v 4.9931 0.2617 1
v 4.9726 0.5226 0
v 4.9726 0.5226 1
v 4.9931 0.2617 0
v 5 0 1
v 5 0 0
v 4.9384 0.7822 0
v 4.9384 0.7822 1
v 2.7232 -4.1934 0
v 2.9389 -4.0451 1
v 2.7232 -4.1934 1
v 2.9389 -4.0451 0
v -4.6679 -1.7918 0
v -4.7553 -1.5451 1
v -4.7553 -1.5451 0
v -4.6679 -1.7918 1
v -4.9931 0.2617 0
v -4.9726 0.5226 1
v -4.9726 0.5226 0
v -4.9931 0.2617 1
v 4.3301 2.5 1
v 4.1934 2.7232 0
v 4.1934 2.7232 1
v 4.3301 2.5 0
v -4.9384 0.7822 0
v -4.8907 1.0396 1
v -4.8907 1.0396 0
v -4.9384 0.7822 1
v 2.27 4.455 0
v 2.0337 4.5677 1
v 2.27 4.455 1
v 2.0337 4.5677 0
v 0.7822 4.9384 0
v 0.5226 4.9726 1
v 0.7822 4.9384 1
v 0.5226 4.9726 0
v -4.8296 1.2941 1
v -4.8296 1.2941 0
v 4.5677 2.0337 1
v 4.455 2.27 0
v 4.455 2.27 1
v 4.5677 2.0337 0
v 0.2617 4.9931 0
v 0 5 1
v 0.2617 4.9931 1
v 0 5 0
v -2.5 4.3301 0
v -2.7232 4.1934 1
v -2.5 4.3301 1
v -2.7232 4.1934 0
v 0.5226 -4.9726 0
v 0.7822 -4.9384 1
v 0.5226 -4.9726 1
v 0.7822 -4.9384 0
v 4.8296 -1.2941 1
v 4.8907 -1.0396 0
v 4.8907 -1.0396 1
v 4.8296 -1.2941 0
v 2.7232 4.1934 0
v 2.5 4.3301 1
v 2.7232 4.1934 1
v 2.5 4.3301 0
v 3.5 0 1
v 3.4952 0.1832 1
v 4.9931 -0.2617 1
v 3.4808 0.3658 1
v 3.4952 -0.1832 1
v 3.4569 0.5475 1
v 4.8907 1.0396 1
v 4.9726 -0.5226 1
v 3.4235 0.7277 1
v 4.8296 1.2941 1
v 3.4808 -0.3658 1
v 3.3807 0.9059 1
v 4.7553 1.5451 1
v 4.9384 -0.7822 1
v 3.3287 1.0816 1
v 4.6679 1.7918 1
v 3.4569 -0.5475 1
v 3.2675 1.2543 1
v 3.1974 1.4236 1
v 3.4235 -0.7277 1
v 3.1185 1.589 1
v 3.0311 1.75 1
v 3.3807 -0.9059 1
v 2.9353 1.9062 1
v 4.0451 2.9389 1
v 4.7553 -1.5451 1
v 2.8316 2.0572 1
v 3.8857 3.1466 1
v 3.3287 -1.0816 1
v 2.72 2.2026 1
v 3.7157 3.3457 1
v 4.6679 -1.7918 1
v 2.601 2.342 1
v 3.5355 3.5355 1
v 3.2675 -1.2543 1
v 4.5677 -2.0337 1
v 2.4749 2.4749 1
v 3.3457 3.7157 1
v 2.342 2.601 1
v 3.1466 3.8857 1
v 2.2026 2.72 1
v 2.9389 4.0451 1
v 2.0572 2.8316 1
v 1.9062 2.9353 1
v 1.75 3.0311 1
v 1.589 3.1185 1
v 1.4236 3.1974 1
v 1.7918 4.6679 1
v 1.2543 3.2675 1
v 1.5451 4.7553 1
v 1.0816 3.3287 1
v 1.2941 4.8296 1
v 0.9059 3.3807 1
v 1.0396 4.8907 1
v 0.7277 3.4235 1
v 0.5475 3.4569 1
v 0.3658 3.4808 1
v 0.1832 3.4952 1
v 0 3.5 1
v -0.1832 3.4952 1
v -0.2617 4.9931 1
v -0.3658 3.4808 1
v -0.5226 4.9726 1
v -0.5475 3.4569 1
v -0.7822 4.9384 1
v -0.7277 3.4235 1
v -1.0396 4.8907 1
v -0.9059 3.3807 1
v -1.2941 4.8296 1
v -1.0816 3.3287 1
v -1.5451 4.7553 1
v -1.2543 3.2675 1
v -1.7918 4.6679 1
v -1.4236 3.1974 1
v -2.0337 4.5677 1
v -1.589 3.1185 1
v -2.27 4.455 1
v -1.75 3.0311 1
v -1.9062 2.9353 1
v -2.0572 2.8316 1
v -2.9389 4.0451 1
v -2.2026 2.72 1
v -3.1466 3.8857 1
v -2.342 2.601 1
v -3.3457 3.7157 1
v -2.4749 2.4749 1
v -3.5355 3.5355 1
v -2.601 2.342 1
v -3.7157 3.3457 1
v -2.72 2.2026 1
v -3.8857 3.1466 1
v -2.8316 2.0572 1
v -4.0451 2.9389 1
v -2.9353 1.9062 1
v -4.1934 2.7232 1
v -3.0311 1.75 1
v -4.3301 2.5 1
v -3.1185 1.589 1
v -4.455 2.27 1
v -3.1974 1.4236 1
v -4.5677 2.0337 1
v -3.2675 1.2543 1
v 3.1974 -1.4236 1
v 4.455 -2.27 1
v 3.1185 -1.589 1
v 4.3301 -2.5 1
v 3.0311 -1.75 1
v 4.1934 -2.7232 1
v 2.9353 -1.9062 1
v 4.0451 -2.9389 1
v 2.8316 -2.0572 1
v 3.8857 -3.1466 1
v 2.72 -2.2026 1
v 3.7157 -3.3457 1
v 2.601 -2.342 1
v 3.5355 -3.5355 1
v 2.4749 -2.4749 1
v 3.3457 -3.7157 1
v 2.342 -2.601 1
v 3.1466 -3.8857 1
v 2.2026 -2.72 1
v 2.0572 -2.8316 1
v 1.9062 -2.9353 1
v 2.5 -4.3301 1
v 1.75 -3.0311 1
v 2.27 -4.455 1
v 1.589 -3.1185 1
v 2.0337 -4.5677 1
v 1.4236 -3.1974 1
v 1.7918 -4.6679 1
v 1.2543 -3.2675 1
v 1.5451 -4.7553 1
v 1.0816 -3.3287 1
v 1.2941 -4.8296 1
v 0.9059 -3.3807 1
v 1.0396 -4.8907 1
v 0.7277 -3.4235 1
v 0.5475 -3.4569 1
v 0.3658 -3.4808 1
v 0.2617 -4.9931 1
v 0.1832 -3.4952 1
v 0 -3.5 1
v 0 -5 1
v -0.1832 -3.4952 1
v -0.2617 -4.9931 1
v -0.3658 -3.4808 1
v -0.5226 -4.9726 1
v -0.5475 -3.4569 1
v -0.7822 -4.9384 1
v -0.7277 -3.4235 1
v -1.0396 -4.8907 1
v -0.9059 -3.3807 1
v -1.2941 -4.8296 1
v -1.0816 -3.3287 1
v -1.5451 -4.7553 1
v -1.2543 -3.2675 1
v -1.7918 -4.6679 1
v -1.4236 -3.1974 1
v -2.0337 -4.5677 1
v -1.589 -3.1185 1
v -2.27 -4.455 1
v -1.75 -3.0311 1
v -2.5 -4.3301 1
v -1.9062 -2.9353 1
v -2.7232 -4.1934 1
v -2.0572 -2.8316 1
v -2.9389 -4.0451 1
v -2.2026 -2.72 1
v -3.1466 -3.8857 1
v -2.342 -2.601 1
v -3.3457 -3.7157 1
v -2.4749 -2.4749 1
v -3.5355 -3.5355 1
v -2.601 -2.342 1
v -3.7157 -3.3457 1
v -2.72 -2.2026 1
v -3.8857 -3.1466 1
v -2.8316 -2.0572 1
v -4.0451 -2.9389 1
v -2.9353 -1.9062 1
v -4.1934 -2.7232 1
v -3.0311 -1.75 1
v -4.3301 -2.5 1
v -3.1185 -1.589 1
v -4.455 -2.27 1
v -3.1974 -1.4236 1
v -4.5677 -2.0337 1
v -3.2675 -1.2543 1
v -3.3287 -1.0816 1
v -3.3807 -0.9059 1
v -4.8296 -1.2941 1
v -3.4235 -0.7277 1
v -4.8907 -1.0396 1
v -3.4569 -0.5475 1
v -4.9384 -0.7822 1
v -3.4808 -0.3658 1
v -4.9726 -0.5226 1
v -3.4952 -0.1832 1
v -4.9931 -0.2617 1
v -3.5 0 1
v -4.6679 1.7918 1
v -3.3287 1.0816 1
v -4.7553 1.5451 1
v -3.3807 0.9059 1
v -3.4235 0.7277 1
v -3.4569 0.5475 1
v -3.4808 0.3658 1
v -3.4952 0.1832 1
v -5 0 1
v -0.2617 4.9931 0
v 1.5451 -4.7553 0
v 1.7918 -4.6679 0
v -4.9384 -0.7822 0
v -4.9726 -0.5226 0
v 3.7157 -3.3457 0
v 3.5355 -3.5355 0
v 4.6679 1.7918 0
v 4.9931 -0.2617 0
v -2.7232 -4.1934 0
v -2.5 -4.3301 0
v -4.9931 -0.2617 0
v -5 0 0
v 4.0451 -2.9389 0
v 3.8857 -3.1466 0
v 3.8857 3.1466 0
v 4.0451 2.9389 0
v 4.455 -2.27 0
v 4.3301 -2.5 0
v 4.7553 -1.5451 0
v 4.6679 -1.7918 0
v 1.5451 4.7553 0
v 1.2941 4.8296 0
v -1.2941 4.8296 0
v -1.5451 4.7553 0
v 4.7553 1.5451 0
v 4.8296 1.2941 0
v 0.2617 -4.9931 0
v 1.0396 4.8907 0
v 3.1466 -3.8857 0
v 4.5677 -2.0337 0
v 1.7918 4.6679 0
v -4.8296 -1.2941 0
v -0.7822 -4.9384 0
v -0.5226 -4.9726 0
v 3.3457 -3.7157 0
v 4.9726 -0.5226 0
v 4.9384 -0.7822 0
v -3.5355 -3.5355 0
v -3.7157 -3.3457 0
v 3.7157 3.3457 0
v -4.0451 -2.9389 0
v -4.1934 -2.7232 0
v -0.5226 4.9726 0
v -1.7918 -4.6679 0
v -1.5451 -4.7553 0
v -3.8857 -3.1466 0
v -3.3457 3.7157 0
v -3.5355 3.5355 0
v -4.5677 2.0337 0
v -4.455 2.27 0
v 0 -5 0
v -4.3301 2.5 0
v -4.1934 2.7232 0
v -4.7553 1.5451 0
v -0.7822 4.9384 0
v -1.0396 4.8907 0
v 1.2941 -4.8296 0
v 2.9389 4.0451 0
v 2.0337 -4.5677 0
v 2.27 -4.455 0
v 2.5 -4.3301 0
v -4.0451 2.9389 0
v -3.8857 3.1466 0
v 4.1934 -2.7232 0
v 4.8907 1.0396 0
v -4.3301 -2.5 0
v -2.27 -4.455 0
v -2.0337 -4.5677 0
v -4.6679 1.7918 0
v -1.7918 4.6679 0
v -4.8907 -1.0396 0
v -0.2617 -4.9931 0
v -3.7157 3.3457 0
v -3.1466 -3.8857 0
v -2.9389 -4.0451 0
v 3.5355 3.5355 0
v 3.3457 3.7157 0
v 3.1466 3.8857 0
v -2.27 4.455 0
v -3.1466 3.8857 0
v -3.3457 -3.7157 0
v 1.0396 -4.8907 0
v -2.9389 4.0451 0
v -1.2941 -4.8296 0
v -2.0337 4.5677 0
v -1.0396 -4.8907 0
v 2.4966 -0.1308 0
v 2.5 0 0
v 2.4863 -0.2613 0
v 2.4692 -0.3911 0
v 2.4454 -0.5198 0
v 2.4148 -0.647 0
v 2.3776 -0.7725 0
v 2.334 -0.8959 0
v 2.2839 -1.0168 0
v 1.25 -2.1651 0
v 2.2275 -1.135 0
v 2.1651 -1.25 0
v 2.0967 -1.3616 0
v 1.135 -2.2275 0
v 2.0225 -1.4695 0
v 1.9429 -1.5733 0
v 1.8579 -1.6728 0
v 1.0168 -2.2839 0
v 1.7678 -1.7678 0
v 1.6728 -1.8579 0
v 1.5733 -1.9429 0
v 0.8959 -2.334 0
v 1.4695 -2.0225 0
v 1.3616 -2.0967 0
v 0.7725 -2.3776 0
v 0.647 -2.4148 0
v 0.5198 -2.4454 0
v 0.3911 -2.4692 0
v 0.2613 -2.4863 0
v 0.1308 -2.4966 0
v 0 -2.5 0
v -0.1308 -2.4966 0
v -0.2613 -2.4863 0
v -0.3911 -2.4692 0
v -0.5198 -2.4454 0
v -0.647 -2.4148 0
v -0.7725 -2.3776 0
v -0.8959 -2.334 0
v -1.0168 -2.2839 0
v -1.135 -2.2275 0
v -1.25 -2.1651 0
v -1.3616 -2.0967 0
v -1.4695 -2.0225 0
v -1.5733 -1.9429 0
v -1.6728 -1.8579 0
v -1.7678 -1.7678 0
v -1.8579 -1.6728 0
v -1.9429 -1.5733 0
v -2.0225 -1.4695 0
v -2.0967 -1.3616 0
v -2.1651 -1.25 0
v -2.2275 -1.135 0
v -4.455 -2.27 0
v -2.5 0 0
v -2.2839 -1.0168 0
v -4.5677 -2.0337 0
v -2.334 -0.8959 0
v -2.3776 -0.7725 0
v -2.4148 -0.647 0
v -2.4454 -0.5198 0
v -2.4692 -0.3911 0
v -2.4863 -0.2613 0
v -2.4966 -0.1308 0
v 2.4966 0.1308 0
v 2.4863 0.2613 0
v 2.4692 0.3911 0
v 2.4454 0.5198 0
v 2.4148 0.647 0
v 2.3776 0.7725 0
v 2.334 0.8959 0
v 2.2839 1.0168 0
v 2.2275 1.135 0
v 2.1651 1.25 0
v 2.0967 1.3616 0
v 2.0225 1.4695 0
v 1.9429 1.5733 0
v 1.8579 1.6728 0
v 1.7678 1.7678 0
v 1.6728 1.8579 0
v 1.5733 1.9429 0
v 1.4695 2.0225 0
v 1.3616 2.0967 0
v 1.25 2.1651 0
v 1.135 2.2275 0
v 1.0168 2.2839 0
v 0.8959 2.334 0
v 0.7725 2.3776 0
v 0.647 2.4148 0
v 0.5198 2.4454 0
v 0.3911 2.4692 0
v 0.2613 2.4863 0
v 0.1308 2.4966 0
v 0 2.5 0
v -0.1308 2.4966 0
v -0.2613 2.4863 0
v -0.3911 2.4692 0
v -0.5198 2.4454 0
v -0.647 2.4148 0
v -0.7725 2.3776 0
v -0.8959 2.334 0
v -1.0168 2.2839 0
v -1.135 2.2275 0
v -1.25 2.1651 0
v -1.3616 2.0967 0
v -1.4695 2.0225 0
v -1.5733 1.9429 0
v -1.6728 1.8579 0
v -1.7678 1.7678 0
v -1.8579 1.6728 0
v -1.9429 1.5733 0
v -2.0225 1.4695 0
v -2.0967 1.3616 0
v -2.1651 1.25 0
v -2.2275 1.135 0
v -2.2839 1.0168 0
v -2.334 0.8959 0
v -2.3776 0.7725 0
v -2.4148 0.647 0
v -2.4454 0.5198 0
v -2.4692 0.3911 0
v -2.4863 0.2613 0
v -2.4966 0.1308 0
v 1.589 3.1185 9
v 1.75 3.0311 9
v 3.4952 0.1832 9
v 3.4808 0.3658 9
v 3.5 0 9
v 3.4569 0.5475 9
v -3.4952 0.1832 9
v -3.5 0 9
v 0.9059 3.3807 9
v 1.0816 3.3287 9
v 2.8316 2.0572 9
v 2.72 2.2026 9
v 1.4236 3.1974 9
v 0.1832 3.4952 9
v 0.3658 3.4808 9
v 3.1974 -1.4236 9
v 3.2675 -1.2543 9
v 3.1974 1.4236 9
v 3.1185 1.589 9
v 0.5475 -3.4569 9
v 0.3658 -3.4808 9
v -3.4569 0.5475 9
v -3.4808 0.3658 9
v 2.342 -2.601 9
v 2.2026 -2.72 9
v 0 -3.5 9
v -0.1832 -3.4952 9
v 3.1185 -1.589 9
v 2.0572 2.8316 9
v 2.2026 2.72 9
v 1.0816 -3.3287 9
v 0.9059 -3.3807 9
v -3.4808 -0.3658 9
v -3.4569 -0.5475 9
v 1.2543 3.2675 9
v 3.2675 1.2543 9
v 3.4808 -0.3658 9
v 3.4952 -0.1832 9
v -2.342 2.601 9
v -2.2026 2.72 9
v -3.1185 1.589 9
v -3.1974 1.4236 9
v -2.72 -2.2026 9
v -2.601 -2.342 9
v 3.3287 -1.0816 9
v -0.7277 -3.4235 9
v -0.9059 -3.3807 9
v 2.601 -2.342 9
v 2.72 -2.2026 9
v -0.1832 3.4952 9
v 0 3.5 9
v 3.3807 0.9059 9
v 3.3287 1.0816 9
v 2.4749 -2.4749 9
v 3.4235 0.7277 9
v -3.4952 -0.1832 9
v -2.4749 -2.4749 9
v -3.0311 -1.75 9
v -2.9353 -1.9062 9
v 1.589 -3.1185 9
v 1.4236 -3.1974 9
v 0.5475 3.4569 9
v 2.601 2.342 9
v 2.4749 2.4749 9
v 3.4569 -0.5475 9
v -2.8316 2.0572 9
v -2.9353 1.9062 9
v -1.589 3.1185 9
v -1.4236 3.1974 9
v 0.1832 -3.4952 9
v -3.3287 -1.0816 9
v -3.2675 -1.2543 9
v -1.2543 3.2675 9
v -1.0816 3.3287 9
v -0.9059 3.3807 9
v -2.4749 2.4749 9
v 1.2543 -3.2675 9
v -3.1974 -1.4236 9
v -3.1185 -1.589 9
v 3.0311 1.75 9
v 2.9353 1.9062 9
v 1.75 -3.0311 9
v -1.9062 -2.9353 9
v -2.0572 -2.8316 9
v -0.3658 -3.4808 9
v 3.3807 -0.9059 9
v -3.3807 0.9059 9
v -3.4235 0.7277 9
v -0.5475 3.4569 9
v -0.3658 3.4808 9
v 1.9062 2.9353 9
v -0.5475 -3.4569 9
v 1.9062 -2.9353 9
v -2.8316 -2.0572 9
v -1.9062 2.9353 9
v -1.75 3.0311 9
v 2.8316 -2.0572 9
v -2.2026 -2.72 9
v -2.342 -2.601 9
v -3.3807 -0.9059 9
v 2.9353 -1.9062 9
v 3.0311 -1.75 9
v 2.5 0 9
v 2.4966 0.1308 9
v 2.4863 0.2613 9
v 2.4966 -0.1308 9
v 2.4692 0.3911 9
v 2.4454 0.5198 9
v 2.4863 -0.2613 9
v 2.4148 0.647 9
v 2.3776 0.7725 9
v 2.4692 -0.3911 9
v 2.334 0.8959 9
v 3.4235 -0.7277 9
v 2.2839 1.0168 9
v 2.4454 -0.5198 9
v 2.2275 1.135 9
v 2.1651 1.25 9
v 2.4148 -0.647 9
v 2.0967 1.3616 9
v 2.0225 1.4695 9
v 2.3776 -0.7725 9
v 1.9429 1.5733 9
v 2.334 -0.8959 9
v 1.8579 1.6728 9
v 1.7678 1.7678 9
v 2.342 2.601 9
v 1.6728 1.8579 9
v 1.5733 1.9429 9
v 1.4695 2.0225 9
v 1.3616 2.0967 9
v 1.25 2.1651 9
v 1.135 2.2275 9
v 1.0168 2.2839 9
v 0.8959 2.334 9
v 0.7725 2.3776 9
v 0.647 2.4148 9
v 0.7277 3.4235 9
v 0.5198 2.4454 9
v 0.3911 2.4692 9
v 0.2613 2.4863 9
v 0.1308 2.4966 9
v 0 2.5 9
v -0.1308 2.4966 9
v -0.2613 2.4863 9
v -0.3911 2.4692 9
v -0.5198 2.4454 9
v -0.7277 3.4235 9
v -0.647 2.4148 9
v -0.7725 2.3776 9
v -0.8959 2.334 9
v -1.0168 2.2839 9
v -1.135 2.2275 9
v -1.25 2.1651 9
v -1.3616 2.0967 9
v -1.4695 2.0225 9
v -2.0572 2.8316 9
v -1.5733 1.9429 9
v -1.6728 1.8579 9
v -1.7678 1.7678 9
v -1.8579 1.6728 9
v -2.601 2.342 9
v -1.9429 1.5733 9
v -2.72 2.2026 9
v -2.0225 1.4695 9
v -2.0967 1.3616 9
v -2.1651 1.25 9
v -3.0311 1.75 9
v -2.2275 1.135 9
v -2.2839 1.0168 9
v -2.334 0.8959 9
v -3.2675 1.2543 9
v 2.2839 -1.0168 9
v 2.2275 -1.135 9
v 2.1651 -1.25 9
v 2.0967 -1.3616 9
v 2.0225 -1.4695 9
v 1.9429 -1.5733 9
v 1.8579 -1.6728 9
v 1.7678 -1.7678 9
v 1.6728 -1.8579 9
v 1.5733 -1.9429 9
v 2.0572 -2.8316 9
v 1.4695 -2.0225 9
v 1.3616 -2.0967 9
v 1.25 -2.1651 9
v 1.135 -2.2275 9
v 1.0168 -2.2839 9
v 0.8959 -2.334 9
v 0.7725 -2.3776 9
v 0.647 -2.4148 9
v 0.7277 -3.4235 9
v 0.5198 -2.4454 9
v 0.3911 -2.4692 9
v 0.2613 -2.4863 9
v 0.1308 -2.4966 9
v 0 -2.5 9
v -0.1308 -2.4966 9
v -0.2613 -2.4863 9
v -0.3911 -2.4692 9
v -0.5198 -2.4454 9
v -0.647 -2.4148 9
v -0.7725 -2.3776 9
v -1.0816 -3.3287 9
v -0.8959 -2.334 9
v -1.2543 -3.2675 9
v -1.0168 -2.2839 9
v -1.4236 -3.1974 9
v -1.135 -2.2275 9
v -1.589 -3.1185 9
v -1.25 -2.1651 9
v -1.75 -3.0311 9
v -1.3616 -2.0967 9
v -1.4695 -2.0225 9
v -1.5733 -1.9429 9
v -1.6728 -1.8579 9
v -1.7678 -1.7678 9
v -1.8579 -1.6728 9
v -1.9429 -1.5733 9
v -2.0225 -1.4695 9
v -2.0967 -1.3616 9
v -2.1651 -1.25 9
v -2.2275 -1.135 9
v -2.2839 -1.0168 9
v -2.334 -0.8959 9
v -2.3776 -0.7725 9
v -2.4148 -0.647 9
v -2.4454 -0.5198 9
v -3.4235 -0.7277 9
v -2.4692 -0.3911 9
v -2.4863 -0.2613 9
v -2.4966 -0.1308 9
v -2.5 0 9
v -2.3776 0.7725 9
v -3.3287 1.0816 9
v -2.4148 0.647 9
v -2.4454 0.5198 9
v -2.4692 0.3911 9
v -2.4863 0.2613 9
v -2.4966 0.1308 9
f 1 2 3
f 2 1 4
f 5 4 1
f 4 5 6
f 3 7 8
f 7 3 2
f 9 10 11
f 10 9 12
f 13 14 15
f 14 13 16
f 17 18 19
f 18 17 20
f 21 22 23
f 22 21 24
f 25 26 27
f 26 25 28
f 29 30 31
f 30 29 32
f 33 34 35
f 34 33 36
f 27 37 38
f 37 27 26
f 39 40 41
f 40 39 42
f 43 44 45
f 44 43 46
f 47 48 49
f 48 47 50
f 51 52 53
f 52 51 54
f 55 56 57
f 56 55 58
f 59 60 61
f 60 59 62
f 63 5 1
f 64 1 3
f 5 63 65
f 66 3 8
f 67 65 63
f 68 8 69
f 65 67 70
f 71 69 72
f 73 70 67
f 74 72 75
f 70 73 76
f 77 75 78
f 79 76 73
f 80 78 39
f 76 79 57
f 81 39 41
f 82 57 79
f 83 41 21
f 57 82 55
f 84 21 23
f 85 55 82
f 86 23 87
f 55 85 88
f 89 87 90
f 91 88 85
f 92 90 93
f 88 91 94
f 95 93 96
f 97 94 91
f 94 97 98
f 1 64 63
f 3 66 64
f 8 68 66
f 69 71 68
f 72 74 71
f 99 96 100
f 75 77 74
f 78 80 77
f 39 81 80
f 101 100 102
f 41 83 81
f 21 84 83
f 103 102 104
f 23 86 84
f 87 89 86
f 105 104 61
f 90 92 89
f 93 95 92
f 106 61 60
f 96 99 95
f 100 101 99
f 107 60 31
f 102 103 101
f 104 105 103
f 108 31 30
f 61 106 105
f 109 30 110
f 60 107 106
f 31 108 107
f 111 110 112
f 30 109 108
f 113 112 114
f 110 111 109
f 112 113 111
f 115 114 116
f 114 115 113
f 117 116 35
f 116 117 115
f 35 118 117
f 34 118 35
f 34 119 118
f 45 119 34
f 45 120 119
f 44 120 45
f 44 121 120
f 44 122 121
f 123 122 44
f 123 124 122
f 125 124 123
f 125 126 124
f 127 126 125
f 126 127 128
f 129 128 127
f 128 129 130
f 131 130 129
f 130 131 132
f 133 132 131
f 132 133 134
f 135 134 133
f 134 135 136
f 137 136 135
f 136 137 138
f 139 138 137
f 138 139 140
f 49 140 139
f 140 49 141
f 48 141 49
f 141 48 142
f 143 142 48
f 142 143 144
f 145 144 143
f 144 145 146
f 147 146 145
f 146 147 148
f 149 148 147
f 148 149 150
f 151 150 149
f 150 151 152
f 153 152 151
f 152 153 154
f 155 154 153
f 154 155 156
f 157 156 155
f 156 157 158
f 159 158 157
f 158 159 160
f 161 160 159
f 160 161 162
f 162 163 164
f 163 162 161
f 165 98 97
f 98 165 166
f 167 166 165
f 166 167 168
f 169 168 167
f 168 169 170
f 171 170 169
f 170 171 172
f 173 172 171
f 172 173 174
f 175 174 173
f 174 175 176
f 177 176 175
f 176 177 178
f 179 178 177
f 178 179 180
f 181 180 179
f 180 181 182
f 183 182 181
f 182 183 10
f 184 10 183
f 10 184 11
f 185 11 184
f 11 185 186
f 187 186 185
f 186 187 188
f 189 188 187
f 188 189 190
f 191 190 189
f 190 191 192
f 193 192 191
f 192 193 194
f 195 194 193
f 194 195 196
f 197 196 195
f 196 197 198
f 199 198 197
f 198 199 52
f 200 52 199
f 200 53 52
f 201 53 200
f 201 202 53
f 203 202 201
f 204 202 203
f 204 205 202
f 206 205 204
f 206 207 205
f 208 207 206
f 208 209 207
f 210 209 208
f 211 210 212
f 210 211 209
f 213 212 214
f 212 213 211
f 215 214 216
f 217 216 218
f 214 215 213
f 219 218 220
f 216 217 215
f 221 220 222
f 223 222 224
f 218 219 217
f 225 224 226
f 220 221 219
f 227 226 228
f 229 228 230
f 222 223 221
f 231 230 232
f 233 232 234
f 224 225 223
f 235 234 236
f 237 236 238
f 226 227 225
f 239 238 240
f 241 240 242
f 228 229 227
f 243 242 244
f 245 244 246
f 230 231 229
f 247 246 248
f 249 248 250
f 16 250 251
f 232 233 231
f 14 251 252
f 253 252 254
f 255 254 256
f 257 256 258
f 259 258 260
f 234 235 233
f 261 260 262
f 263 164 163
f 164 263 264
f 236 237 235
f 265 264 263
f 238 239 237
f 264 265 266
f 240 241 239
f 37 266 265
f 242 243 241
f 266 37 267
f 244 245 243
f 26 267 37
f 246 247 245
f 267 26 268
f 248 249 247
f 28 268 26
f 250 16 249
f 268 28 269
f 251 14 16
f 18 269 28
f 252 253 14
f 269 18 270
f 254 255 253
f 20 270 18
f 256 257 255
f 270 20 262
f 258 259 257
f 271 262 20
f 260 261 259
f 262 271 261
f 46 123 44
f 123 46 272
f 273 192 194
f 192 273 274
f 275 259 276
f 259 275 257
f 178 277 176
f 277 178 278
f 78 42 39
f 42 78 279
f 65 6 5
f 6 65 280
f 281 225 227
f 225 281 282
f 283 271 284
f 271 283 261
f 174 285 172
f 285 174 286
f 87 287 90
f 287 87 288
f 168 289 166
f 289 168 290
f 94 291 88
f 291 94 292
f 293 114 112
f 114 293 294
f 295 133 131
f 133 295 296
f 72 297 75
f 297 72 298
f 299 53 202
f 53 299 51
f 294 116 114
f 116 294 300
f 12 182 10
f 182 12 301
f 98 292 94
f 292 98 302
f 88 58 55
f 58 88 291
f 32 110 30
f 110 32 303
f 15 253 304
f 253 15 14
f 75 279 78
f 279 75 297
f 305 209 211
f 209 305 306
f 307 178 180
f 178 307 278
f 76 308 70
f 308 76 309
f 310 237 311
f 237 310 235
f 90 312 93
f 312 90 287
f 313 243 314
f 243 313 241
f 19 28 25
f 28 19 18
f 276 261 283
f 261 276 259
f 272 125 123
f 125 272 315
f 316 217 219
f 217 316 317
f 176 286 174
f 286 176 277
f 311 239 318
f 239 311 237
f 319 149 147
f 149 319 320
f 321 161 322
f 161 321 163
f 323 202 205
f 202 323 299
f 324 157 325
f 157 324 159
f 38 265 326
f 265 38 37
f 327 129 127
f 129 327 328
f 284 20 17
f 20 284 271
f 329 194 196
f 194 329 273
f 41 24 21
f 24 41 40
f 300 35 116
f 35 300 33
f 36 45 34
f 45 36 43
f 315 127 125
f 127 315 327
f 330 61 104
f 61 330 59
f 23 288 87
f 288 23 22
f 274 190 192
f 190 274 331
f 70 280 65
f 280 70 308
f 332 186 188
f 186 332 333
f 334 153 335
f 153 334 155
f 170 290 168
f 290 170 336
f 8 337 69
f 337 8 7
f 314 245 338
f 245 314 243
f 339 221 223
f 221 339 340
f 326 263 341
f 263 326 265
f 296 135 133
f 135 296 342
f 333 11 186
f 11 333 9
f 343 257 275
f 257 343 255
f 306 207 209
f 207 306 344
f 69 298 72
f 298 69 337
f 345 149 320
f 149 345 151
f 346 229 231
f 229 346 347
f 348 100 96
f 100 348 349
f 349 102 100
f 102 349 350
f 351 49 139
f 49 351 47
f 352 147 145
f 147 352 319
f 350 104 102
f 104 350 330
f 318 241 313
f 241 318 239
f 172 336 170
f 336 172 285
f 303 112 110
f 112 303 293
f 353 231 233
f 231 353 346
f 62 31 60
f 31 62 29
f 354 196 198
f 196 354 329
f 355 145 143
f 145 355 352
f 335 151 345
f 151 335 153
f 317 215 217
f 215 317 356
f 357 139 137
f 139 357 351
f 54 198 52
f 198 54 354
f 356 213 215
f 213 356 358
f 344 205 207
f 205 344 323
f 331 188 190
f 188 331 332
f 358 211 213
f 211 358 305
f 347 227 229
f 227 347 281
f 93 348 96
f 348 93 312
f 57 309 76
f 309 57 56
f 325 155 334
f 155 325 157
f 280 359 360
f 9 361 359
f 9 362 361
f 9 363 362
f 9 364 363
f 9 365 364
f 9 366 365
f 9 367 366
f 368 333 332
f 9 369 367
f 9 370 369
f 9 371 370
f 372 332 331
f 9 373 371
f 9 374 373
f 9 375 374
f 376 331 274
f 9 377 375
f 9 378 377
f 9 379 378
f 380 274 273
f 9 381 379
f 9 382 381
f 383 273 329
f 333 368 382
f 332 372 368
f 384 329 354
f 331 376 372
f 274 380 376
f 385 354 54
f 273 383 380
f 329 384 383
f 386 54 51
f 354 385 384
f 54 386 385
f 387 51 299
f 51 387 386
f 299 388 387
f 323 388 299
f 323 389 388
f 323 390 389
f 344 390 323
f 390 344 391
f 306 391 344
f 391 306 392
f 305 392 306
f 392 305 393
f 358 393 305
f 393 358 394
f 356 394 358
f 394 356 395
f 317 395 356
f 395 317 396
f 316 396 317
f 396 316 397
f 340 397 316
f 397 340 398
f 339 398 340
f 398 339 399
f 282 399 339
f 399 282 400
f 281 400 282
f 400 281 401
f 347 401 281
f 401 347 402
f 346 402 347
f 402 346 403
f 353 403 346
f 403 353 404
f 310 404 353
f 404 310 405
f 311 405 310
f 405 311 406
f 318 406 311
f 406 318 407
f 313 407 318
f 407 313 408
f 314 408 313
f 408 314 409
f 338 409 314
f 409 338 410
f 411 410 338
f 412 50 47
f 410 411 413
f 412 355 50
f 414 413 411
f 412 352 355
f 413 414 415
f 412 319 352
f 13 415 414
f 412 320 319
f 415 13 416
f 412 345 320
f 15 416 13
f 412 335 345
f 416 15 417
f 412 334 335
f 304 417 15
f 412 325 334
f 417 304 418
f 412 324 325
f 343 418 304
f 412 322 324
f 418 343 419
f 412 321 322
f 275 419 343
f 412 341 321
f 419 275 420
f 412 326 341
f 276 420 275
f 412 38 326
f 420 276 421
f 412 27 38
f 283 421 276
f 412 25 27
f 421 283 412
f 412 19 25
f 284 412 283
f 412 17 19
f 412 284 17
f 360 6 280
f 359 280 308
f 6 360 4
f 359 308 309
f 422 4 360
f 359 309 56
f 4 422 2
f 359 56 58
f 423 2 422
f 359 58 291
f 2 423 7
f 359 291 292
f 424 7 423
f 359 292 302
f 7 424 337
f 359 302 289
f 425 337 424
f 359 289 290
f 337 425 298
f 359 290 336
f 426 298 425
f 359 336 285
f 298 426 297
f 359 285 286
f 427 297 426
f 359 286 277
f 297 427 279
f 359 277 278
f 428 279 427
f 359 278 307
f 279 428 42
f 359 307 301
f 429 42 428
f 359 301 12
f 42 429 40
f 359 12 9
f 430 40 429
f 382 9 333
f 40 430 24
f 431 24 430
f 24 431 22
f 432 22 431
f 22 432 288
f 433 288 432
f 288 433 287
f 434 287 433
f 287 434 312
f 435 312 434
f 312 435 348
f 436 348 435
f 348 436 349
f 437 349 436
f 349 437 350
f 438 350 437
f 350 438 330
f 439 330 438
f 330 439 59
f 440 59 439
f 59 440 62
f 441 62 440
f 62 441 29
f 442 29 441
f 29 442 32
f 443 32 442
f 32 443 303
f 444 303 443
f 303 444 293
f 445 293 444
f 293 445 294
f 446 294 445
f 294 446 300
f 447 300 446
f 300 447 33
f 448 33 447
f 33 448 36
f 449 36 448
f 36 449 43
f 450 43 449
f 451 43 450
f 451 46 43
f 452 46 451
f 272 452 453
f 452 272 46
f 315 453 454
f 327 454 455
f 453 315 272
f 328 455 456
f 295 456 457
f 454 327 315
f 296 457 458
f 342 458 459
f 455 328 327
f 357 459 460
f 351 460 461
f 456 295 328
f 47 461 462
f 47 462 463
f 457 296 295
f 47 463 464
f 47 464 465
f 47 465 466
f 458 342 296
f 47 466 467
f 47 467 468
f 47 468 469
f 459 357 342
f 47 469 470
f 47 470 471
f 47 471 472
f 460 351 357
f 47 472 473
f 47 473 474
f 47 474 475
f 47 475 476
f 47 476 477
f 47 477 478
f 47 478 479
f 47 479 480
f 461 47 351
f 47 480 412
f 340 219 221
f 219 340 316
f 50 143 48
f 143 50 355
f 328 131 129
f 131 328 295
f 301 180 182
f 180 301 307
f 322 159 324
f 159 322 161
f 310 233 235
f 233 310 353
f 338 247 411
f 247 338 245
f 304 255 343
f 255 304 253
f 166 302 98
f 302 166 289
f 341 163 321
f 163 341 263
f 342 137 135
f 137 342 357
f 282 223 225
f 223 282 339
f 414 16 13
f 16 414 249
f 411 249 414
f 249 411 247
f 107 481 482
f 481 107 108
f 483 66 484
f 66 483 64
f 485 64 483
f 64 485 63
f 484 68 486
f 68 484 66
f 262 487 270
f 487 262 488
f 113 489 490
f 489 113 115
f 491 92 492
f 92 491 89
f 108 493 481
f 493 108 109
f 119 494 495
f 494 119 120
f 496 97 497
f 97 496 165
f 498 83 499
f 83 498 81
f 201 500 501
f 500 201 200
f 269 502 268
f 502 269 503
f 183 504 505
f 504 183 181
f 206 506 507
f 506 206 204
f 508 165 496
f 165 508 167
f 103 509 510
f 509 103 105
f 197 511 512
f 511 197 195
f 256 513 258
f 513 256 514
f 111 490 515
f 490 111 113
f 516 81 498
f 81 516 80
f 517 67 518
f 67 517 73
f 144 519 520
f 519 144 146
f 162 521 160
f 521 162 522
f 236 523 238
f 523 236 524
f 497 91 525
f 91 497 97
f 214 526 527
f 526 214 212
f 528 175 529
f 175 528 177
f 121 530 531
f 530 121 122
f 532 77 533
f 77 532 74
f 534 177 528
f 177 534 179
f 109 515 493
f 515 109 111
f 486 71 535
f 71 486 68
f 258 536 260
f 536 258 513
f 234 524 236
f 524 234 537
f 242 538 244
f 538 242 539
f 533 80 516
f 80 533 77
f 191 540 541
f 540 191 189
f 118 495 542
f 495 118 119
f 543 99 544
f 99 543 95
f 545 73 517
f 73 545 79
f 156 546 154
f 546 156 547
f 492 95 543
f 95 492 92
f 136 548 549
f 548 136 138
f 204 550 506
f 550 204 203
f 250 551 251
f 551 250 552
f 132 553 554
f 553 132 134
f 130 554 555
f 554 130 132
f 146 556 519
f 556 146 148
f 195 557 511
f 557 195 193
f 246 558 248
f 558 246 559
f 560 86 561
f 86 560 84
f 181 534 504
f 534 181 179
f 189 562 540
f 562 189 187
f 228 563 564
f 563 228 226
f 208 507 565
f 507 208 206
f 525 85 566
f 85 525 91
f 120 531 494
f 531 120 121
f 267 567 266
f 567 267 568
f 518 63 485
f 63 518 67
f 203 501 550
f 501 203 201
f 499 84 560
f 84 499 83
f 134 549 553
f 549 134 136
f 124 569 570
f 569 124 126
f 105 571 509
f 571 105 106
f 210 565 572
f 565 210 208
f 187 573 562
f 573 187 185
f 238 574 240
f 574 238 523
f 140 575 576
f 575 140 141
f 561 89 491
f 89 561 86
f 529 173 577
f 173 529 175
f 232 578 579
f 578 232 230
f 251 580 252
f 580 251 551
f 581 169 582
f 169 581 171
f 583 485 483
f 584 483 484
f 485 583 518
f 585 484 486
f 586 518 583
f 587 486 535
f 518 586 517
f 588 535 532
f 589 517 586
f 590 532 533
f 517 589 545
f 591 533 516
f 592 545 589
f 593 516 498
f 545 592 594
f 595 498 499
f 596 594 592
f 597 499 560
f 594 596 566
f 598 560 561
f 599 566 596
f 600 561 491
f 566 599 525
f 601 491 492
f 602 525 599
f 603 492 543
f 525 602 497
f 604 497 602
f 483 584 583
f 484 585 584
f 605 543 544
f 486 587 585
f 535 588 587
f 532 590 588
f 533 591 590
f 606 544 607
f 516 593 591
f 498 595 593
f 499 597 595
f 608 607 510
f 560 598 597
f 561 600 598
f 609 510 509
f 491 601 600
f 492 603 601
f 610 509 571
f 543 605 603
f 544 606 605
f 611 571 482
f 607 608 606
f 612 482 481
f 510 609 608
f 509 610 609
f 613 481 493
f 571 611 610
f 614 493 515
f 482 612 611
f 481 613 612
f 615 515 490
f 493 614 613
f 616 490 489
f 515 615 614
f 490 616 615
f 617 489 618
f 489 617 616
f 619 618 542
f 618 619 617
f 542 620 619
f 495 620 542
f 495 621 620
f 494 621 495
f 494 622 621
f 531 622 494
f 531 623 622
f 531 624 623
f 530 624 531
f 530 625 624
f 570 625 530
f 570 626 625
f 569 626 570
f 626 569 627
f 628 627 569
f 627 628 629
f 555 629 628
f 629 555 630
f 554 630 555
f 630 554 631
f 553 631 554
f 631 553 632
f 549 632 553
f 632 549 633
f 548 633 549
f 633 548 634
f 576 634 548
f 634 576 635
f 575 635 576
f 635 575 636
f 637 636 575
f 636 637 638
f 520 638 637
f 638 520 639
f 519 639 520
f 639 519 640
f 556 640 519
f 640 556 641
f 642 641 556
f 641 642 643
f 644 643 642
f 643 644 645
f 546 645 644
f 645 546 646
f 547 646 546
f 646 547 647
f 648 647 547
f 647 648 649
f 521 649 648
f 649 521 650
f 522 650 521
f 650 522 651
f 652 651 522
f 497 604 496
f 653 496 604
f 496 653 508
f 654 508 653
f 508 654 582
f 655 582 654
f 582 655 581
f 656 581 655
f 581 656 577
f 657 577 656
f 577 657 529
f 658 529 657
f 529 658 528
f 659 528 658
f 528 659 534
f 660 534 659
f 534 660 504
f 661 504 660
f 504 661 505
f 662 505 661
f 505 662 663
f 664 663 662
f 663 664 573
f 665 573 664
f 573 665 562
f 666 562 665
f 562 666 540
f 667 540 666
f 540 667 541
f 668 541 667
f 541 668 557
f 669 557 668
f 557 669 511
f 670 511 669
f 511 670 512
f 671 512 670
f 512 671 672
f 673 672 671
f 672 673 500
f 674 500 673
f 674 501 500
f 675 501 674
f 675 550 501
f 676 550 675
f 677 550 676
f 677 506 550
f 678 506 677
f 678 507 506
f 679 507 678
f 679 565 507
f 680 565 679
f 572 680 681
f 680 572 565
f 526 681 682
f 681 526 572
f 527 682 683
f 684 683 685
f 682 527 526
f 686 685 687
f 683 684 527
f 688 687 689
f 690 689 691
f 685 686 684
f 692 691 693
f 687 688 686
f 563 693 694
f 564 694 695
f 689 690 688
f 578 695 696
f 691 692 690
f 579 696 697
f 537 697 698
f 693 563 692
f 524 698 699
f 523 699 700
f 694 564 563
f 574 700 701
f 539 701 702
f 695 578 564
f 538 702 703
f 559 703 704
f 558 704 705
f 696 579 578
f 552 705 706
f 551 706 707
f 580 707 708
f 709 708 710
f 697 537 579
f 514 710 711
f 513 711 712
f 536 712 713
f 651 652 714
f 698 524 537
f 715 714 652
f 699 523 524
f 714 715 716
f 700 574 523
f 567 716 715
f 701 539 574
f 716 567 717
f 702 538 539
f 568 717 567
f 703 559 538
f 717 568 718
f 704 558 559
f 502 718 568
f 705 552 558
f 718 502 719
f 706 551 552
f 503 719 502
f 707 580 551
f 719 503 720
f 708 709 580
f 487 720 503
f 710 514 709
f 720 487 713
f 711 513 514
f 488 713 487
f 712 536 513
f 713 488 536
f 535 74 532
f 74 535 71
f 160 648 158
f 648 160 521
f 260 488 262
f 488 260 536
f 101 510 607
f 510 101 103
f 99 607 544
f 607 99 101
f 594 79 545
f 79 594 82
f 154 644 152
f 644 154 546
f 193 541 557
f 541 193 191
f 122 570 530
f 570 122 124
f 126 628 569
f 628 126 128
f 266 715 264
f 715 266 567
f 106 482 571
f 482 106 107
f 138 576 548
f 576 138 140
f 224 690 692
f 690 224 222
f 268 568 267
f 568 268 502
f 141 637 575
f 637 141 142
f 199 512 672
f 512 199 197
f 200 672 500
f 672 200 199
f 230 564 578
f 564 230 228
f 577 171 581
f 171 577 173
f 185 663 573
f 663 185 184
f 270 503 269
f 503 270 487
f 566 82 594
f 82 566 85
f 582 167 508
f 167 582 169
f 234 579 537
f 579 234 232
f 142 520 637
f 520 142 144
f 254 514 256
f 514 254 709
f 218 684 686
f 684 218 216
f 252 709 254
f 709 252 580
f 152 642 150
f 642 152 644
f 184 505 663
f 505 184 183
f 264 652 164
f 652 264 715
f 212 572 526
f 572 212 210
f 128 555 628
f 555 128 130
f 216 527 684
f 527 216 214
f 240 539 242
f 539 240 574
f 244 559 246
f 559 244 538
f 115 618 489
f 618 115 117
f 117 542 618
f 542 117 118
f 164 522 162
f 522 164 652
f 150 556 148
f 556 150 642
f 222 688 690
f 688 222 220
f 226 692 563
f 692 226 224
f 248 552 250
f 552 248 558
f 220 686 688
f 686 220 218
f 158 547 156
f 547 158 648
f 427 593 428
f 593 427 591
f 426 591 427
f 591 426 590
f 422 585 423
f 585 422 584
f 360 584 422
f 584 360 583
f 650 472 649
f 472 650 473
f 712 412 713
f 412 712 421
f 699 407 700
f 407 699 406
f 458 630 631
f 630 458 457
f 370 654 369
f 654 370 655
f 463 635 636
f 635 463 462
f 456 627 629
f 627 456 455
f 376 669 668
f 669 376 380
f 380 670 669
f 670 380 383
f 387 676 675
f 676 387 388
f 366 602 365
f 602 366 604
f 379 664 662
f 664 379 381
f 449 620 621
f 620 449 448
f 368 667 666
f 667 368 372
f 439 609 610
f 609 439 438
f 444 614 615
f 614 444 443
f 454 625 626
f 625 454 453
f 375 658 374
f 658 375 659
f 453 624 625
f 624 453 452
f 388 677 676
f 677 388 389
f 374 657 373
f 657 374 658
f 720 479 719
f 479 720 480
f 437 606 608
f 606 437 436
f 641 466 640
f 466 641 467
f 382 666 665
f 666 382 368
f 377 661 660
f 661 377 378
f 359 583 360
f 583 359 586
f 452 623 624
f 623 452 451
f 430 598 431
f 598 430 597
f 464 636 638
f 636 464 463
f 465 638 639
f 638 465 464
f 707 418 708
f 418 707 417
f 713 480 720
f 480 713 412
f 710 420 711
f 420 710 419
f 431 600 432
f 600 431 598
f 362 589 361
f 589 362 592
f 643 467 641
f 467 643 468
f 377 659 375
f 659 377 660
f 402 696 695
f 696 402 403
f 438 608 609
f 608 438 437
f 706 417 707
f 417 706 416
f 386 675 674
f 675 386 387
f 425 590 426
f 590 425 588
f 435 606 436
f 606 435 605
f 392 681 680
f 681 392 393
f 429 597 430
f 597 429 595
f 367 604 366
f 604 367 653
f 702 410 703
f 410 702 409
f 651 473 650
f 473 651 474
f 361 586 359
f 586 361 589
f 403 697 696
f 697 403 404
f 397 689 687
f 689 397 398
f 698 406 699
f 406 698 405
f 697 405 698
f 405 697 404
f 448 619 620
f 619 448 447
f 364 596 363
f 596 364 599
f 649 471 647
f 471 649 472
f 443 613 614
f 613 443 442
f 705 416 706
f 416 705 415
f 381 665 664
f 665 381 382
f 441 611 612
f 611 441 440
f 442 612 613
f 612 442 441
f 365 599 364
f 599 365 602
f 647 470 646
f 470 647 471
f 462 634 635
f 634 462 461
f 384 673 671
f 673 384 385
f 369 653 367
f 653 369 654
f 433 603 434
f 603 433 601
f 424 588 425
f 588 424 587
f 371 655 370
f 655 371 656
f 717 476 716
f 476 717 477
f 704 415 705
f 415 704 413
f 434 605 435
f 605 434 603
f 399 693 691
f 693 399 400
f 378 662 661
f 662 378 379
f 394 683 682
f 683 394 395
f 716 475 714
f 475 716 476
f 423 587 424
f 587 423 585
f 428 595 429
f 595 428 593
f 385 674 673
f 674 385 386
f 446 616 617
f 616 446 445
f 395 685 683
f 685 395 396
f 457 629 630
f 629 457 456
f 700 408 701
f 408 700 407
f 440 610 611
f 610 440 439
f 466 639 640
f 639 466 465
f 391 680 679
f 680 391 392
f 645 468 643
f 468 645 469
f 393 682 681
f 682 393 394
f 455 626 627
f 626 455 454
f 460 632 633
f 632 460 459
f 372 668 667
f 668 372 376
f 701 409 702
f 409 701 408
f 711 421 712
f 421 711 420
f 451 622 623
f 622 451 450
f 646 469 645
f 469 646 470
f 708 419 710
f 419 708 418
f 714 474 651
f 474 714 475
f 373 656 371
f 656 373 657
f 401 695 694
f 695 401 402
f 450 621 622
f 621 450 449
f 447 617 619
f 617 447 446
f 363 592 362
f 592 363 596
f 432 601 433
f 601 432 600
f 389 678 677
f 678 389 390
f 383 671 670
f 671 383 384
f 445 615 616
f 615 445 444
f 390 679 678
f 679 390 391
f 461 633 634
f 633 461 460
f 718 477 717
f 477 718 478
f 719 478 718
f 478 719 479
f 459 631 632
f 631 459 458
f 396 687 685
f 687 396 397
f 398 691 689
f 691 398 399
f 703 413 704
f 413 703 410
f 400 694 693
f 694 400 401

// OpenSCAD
// Real Lonely T-Rex Game: Background Plate Spacer
// Copyright (C) 2017, Uri Shaked and Ariella Eliassaf

$fn = 120;

difference() {
    union() {
        cylinder(h=1, r=5);
        cylinder(h=9, r=3.5);
    }
    
    cylinder(h=9, r=2.5);
}    
